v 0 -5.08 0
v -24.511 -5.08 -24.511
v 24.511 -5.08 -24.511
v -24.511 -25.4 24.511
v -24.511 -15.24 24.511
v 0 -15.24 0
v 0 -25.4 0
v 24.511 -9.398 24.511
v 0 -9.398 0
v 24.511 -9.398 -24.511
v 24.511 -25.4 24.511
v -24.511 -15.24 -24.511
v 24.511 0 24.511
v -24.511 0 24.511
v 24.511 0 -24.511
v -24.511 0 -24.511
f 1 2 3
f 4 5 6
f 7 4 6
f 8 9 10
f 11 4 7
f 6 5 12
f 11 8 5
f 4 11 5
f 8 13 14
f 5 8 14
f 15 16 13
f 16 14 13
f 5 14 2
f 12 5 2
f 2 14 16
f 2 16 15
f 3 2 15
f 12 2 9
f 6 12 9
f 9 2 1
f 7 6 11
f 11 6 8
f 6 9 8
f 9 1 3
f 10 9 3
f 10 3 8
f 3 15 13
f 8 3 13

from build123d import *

# Parameters (mm, degrees)
F1_DEPTH = 25.4
F2_DEPTH = 15.24
F3_DEPTH = 9.398
F4_DEPTH = 5.08


with BuildPart() as f1:
    # F0 (on Front) → F1 (new body)
    with BuildSketch(Plane.XZ):
        Polygon((0, 0), (24.510982, 24.510982), (-24.510982, 24.510982), align=None)
    extrude(amount=F1_DEPTH)

    # F0 (on Front) → F2 (join)
    with BuildSketch(Plane.XZ):
        Polygon((-24.510982, 24.510982), (-24.510982, -24.510982), (0, 0), align=None)
    extrude(amount=F2_DEPTH)

    # F0 (on Front) → F3 (join)
    with BuildSketch(Plane.XZ):
        Polygon((0, 0), (24.510982, -24.510982), (24.510982, 24.510982), align=None)
    extrude(amount=F3_DEPTH)

    # F0 (on Front) → F4 (join)
    with BuildSketch(Plane.XZ):
        Polygon((-24.510982, -24.510982), (24.510982, -24.510982), (0, 0), align=None)
    extrude(amount=F4_DEPTH)


solid = f1.part
